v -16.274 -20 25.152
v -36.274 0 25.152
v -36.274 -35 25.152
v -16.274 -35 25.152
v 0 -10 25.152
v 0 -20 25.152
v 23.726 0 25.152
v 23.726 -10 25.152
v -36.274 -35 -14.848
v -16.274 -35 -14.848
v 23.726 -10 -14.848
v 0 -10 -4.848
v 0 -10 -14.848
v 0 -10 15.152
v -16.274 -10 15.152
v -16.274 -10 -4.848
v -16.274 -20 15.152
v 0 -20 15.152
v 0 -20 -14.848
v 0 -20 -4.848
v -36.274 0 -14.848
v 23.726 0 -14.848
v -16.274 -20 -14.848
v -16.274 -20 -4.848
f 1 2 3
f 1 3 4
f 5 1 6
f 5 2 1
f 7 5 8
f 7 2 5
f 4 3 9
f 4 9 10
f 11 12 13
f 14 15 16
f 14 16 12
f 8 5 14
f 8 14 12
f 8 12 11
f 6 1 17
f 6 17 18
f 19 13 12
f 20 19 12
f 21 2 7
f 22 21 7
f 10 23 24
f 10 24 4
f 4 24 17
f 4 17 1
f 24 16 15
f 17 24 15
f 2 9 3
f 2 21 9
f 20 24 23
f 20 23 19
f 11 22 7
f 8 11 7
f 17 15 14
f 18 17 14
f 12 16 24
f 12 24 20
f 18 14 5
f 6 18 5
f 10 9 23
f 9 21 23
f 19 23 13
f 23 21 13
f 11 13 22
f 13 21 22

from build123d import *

# Parameters (mm, degrees)
F0_W     = 20
F0_H     = 10
F1_DEPTH = 10
F2_W     = 20
F2_H     = 40
F3_DEPTH = 25
F4_W     = 16.2738668919
F4_H     = 10
F5_DEPTH = 10


with BuildPart() as f1:
    # F0 (on Front) → F1 (new body)
    with BuildSketch(Plane.XZ):
        Polygon((-16.2738668919, 25.1521477103), (-36.2738668919, 25.1521477103), (-36.2738668919, -14.8478522897), (-16.2738668919, -14.8478522897), (-16.2738668919, -4.8478522897), (-16.2738668919, 15.1521477103), align=None)
        with Locations((-6.2738668919, 20.1521477103)):
            Rectangle(F0_W, F0_H)
        Polygon((23.7261331081, 25.1521477103), (3.7261331081, 25.1521477103), (3.7261331081, 15.1521477103), (-16.2738668919, 15.1521477103), (-16.2738668919, -4.8478522897), (3.7261331081, -4.8478522897), (3.7261331081, -14.8478522897), (23.7261331081, -14.8478522897), align=None)
        with Locations((-6.2738668919, -9.8478522897)):
            Rectangle(F0_W, F0_H)
    extrude(amount=F1_DEPTH)

    # F2 (on face) → F3 (join)
    with BuildSketch(Plane.XZ.offset(10)):
        with Locations((-26.2738668919, 5.1521477103)):
            Rectangle(F2_W, F2_H)
    extrude(amount=F3_DEPTH)

    # F4 (on face) → F5 (join)
    with BuildSketch(Plane.XZ.offset(10)):
        with Locations((-8.1369334459, 20.1521477103)):
            Rectangle(F4_W, F4_H)
        with Locations((-8.1369334459, -9.8478522897)):
            Rectangle(F4_W, F4_H)
    extrude(amount=F5_DEPTH)


solid = f1.part
